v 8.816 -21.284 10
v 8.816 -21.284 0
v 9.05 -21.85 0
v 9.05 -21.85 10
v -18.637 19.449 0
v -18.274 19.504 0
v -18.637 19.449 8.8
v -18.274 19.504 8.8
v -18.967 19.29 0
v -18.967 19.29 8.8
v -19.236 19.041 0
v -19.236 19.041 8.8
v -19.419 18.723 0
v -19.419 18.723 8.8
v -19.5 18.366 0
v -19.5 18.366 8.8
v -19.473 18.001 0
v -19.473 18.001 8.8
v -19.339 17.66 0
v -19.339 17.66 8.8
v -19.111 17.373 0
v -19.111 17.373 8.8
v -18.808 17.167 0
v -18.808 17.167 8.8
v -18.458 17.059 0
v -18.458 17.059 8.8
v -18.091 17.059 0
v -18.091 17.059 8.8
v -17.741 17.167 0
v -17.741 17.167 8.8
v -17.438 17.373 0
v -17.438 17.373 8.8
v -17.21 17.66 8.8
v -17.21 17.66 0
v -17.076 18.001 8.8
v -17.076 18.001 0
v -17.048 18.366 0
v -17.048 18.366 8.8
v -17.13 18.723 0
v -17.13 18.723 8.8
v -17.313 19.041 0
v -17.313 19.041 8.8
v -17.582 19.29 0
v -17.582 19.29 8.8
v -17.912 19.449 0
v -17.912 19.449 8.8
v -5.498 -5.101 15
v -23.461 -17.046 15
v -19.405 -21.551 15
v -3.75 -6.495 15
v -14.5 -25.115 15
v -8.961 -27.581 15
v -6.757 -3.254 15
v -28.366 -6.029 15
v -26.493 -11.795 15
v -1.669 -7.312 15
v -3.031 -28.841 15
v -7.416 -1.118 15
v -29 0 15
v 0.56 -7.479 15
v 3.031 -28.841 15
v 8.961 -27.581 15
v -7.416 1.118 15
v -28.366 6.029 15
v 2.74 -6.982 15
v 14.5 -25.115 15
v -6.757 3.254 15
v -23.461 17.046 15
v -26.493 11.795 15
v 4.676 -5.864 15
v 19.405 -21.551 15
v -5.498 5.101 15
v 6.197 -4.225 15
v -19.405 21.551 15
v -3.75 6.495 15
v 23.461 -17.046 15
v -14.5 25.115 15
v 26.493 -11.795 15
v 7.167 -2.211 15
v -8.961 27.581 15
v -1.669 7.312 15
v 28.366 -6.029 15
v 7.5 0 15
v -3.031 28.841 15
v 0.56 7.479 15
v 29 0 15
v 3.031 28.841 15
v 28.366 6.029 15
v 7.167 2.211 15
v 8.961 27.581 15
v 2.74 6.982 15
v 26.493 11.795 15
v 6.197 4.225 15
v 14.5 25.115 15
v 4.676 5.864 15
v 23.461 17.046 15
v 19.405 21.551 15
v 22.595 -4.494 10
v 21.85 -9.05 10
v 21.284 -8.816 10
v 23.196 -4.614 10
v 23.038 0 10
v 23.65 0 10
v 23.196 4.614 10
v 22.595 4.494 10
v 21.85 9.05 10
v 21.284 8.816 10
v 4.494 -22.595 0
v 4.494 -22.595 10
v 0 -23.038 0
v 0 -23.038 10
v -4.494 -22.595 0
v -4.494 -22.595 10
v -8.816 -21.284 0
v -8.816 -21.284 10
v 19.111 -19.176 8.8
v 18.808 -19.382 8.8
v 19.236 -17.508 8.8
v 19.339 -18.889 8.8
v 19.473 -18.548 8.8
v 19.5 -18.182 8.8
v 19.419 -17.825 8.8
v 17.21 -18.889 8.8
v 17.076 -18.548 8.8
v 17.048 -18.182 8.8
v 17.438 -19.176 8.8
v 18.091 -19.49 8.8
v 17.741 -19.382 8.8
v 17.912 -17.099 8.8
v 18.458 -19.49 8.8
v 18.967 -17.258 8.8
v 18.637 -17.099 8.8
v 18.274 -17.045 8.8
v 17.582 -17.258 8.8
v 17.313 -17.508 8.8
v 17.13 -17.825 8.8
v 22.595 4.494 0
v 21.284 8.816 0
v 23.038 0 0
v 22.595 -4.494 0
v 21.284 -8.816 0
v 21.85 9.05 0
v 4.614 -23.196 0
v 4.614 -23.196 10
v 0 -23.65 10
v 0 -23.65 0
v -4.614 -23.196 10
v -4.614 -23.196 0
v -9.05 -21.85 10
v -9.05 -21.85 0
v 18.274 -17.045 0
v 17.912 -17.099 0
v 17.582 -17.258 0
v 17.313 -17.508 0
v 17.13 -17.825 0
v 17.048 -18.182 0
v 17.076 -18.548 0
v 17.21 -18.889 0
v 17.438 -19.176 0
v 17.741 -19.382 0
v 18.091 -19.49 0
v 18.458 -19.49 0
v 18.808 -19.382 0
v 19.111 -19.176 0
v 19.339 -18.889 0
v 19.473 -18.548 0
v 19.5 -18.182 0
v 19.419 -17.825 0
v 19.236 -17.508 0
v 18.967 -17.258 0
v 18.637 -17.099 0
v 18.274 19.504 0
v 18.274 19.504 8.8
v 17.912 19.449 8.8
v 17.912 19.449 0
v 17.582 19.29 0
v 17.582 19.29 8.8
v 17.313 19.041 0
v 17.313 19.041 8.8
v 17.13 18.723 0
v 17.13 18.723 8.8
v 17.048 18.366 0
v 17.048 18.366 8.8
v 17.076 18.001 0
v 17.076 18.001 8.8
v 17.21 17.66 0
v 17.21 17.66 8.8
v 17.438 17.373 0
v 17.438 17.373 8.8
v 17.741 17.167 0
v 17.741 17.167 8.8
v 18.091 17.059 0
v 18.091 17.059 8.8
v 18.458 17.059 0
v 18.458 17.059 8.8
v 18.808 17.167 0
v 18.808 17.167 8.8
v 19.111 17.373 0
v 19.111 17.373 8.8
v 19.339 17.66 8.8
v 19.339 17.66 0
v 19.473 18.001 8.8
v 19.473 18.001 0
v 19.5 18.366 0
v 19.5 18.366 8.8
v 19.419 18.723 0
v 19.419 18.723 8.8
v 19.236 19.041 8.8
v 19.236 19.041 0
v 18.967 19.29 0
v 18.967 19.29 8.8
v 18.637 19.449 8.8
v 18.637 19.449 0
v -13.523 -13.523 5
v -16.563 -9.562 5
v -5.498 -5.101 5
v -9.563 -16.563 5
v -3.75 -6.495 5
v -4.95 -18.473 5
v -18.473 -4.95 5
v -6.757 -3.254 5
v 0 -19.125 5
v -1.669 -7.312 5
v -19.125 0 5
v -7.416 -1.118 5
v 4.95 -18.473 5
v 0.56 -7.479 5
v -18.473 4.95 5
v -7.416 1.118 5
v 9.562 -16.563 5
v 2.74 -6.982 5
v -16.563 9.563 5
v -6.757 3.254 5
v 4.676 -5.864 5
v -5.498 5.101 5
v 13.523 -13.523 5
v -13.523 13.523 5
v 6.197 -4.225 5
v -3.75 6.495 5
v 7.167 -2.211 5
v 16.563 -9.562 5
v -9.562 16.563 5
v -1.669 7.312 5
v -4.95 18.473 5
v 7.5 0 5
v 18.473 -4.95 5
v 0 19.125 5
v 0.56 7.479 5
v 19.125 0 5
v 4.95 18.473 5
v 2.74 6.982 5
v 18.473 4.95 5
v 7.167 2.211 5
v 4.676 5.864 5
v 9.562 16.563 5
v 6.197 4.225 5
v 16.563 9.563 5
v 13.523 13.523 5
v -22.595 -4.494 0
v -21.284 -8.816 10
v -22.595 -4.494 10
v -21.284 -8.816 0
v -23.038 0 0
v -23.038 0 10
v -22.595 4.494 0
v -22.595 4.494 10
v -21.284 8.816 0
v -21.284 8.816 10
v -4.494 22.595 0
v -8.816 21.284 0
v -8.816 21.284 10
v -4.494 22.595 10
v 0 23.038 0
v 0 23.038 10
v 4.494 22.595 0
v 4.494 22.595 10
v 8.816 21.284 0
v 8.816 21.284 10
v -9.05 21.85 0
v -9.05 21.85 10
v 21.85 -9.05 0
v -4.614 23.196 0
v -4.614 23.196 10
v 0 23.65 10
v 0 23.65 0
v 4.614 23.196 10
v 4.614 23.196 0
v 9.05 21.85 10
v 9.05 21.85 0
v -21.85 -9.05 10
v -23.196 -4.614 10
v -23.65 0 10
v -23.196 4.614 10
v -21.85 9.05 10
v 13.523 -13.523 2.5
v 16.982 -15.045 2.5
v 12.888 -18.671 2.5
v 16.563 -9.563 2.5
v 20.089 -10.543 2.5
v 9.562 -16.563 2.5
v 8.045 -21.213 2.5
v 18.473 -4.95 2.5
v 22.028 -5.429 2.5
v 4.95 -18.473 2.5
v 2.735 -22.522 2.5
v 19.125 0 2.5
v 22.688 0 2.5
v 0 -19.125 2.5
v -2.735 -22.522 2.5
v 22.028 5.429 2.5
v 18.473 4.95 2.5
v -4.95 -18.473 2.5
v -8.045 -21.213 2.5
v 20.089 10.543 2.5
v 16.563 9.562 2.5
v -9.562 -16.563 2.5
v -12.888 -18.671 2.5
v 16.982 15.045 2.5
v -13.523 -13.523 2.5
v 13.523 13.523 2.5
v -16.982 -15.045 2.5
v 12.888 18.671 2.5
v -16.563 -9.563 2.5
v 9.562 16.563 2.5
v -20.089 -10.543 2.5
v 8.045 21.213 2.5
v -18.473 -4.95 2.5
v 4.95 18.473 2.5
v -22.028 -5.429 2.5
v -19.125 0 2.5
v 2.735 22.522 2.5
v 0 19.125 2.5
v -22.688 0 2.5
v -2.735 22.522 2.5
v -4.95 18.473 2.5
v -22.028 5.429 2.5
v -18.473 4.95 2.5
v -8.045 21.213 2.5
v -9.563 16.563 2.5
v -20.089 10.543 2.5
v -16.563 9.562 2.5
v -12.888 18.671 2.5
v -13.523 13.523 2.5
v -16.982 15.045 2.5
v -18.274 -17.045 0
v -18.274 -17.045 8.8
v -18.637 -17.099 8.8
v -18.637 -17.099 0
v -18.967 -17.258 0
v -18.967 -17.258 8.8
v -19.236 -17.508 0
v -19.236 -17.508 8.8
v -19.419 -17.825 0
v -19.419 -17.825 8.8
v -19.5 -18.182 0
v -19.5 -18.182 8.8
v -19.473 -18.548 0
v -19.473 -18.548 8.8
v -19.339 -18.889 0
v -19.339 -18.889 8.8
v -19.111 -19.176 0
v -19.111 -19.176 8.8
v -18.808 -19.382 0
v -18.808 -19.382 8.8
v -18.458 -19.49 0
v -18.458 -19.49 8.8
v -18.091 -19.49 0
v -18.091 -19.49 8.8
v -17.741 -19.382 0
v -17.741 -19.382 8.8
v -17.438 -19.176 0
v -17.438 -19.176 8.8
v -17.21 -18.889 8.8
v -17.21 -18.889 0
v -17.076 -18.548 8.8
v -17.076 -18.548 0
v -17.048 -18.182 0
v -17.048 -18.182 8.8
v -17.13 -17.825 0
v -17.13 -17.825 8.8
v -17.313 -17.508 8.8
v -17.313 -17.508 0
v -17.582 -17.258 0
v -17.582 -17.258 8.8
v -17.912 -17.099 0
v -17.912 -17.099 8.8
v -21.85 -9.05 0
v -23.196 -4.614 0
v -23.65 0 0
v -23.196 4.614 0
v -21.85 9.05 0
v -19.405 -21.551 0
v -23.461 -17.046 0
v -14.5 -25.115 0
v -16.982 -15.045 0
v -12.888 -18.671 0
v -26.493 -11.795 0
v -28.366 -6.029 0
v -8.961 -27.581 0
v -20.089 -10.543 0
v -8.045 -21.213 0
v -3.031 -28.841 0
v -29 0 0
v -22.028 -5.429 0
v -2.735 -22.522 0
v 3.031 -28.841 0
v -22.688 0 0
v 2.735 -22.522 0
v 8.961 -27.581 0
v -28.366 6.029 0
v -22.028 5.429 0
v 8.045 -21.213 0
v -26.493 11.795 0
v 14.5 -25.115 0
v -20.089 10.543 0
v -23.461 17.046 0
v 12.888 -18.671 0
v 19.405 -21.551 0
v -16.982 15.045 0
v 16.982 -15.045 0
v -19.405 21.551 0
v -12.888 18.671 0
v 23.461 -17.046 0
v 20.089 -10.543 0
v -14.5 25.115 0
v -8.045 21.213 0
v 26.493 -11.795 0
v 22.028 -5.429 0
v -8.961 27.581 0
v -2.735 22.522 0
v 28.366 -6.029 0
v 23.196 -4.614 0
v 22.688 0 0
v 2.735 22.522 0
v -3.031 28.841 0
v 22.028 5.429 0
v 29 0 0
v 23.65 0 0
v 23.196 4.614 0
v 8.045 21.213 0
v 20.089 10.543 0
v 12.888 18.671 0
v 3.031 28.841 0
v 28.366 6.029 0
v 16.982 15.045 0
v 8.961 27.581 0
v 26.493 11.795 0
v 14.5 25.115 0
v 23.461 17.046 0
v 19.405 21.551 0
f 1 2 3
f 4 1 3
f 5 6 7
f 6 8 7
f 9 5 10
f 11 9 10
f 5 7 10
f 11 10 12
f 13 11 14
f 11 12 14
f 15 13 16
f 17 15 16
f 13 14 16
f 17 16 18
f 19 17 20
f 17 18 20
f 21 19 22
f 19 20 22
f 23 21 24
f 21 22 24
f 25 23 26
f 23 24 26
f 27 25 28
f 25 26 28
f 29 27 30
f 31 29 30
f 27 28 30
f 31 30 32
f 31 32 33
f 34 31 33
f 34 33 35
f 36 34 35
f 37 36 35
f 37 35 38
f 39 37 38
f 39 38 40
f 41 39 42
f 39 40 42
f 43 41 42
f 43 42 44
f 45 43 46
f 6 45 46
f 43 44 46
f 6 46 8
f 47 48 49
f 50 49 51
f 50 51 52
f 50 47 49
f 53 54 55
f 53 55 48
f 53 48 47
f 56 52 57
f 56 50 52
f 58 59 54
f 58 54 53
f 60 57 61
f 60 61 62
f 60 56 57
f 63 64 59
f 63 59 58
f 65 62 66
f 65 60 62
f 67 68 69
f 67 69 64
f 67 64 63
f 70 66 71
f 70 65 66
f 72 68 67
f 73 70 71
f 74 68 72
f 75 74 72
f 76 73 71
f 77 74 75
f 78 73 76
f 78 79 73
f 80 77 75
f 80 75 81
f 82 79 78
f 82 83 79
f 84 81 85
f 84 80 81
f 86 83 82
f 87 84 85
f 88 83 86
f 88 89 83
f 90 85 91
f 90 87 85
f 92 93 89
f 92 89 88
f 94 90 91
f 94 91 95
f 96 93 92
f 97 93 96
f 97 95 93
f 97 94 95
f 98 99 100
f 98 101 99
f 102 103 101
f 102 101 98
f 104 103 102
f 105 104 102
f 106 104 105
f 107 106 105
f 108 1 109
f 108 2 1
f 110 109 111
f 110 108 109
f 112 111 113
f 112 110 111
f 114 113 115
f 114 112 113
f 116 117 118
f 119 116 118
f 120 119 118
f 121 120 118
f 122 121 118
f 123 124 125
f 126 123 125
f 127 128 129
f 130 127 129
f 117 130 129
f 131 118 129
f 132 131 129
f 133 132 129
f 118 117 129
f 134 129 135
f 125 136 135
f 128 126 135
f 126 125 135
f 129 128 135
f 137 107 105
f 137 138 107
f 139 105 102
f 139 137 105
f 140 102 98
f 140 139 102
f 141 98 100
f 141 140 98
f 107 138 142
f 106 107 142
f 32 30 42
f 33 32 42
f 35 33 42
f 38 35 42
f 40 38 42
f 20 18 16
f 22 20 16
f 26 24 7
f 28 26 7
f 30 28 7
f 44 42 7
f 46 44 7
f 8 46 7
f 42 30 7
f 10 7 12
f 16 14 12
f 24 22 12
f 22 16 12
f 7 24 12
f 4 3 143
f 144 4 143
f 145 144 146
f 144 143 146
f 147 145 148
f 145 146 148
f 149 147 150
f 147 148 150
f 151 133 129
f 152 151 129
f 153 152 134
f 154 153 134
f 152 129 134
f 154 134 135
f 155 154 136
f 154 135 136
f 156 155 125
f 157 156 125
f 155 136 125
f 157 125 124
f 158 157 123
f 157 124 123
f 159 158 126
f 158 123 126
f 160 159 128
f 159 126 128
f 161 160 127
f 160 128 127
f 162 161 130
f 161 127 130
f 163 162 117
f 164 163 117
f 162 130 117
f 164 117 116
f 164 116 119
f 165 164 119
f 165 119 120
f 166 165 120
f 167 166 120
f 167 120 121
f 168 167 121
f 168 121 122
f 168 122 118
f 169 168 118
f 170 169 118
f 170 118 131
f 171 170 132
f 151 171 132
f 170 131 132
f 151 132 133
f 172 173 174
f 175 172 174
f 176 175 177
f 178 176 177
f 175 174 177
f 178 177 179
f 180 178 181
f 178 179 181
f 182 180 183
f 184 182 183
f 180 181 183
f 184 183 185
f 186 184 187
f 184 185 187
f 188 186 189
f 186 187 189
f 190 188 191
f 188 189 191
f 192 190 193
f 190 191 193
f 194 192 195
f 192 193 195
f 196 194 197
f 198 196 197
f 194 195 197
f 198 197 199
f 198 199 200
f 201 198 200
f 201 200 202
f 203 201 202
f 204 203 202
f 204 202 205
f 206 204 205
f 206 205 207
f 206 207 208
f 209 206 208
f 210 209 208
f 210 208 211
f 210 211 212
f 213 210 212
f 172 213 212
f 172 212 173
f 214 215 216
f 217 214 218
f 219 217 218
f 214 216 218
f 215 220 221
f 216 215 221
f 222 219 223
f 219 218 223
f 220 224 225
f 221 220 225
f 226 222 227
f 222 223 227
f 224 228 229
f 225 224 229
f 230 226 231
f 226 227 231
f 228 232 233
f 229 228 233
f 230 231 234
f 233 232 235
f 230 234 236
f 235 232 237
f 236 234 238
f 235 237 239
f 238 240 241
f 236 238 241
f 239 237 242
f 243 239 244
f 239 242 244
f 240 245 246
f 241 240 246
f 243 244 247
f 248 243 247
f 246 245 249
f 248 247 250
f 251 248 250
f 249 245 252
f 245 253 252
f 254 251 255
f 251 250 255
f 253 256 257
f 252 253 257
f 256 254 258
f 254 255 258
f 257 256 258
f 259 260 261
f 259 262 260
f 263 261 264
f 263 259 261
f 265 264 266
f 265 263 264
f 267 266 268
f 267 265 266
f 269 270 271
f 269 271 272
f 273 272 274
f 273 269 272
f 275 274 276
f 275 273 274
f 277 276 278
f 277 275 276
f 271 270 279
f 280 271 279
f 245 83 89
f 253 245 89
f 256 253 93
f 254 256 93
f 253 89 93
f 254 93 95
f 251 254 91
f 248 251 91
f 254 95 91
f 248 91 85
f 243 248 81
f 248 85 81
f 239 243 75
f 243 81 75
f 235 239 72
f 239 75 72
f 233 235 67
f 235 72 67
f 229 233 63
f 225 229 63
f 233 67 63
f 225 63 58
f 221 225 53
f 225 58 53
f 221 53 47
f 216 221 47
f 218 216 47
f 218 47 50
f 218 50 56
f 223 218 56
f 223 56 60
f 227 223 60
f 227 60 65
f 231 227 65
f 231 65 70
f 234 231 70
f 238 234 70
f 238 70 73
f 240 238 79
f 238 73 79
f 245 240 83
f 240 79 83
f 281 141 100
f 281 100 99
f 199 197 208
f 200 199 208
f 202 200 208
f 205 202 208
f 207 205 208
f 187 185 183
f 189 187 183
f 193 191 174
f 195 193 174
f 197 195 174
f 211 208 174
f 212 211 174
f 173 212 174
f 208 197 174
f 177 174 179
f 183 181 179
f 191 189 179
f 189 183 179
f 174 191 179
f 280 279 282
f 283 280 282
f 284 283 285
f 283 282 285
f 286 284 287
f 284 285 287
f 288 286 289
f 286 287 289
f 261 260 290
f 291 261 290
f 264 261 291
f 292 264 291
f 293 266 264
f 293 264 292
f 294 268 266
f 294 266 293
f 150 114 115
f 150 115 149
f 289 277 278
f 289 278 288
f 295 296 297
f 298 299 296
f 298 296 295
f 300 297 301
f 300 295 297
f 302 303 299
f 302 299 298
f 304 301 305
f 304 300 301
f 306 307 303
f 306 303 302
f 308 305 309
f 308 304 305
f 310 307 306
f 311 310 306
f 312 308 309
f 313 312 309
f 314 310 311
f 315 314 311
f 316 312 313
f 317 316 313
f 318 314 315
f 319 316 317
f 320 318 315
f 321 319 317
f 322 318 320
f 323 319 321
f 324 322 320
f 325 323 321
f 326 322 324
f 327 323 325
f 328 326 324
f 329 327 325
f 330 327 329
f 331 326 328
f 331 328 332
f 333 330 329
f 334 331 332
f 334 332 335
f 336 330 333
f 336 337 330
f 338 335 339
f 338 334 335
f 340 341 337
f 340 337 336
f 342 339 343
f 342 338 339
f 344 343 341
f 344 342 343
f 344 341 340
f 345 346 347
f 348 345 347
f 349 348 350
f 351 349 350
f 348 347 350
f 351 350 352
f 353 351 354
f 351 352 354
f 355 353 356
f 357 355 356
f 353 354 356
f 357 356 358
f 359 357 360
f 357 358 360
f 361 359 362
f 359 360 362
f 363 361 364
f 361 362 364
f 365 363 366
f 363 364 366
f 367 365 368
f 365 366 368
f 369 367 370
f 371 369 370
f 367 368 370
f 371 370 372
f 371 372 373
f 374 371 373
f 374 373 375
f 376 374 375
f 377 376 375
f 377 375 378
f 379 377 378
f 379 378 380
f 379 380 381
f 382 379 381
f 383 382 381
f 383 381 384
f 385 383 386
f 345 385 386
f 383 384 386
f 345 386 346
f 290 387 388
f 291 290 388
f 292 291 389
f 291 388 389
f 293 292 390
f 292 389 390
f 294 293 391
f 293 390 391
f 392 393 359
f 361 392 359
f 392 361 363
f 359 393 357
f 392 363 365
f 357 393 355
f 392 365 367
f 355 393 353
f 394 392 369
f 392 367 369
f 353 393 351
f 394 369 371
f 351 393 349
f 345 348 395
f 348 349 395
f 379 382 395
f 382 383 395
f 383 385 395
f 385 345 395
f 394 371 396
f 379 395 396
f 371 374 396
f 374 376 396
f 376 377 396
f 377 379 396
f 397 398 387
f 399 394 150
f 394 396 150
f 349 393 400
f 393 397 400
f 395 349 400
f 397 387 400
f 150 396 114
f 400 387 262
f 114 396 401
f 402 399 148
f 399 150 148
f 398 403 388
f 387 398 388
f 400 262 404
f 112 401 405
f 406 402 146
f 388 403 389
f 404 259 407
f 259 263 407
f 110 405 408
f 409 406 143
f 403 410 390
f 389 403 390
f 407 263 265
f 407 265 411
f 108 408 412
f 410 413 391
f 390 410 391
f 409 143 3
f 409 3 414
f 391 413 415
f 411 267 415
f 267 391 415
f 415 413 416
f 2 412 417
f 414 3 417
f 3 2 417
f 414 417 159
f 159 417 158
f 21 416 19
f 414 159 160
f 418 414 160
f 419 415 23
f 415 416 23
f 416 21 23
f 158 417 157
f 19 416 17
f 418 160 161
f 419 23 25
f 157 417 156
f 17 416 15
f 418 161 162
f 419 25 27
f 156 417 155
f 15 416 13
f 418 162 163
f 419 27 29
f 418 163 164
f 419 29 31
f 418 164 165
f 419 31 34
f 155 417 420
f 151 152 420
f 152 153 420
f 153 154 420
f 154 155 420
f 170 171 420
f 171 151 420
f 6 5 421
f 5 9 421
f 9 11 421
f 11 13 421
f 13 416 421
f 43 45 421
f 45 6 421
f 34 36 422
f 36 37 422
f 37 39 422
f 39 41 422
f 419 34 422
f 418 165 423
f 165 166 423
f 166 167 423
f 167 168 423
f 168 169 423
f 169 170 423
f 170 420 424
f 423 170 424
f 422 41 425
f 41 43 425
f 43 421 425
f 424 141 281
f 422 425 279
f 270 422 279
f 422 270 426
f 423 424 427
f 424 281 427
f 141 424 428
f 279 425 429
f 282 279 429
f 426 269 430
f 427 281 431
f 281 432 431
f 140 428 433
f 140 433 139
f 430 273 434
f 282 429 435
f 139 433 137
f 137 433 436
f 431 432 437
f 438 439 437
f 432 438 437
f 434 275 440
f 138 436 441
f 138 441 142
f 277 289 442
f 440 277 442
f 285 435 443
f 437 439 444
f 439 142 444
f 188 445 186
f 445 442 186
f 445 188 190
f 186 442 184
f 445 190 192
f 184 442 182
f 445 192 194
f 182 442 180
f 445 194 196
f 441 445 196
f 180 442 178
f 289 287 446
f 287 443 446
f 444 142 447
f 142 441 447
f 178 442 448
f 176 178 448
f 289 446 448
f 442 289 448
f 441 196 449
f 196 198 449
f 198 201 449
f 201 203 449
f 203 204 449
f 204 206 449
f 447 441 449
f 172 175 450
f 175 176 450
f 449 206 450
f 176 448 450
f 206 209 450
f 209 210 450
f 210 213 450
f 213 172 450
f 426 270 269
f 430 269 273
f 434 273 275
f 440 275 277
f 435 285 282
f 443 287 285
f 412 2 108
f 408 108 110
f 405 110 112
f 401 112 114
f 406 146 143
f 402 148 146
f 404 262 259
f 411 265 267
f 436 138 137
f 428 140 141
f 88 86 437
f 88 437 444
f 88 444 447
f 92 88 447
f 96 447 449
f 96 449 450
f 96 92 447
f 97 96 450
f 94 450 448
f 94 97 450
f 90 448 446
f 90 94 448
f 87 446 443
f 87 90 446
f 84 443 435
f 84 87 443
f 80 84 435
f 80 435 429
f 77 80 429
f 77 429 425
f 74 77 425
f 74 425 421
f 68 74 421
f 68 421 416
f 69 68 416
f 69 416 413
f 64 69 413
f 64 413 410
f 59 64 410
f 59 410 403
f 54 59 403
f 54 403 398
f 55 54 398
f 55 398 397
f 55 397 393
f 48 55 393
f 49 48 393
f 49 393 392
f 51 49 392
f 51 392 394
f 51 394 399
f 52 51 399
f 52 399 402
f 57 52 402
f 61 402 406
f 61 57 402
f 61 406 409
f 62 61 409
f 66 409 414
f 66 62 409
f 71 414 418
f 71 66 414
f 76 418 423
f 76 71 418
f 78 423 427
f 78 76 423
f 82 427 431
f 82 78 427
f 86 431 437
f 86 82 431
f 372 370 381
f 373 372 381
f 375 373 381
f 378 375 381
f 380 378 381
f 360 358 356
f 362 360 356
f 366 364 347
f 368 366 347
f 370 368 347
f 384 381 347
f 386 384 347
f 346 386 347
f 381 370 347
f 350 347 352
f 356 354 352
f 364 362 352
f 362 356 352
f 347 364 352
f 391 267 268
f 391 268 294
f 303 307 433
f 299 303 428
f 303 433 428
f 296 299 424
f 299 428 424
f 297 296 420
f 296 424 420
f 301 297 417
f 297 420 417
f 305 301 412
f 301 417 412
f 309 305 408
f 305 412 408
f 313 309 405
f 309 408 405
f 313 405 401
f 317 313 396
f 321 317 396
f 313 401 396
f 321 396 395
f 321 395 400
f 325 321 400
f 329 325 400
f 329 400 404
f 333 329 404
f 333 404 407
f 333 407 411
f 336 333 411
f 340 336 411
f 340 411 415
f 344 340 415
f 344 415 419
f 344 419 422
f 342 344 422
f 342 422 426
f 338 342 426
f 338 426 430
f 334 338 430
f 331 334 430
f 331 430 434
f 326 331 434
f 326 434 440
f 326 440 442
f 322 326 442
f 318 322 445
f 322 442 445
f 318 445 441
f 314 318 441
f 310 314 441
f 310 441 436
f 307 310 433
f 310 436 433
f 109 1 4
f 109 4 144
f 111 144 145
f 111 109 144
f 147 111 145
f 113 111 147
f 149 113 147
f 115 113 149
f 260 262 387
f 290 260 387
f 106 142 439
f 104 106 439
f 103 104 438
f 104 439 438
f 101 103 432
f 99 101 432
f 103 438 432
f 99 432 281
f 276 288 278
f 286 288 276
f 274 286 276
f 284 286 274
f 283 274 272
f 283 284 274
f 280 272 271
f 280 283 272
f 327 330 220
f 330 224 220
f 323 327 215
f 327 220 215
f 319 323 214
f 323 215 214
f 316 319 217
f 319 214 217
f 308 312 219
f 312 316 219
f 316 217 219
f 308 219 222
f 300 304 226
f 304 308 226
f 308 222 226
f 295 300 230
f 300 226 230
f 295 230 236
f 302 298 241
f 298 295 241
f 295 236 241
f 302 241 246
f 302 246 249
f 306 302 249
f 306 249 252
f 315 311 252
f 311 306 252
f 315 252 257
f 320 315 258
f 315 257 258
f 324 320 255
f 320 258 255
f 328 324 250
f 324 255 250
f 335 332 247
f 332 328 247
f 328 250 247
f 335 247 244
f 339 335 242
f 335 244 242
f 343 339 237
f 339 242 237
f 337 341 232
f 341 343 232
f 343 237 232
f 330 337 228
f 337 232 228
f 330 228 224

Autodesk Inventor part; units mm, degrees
ref_plane "YZ Plane" through (0, 0, 0) normal (1, 0, 0) x (0, 1, 0)
ref_plane "XZ Plane" through (0, 0, 0) normal (0, 1, 0) x (-1, 0, 0)
ref_plane "XY Plane" through (0, 0, 0) normal (0, 0, 1) x (1, 0, 0)
sketch "Sketch1" plane through (0, 0, 0) normal (0, 0, 1) x (1, 0, 0)
  circle A0 centre (0, 0) radius 24
  circle A1 centre (0, 0) radius 22.6875
  dimension "d0" = 48
  dimension "d2" = 45.375
extrude "Extrusion1" add sketch "Sketch1" along normal blind 5
sketch "Sketch2" plane through (0, 0, 5) normal (0, 0, 1) x (1, 0, 0)
  circle A0 centre (0, 0) radius 24 projected
extrude "Extrusion2" add sketch "Sketch2" along normal blind 10
sketch "Sketch3" plane through (0, 0, 0) normal (0, 0, -1) x (-1, 0, 0)
  circle A0 centre (0, 0) radius 22.6875
  circle A1 centre (0, 0) radius 24
  arc A2 (8.8161, 21.2839) -> (-8.8161, 21.2839) centre (0, 0) ccw
  arc A3 (9.0505, 21.8498) -> (-9.0505, 21.8498) centre (0, 0) ccw
  circle A4 centre (0, 0) radius 7.5
  line L0 (0, 0) -> (0, 19.001)
  line L1 (-8.8161, 21.2839) -> (-9.0505, 21.8498)
  line L2 (8.8161, 21.2839) -> (9.0505, 21.8498)
  arc A5 (-21.2839, 8.8161) -> (-21.2839, -8.8161) centre (0, 0) ccw
  arc A6 (-21.8498, 9.0505) -> (-21.8498, -9.0505) centre (0, 0) ccw
  line L3 (-21.2839, -8.8161) -> (-21.8498, -9.0505)
  line L4 (-21.2839, 8.8161) -> (-21.8498, 9.0505)
  arc A7 (-8.8161, -21.2839) -> (8.8161, -21.2839) centre (0, 0) ccw
  arc A8 (-9.0505, -21.8498) -> (9.0505, -21.8498) centre (0, 0) ccw
  line L5 (8.8161, -21.2839) -> (9.0505, -21.8498)
  line L6 (-8.8161, -21.2839) -> (-9.0505, -21.8498)
  arc A9 (21.2839, -8.8161) -> (21.2839, 8.8161) centre (0, 0) ccw
  arc A10 (21.8498, -9.0505) -> (21.8498, 9.0505) centre (0, 0) ccw
  line L7 (21.2839, 8.8161) -> (21.8498, 9.0505)
  line L8 (21.2839, -8.8161) -> (21.8498, -9.0505)
  point P0 (-19.001, 0)
  point P1 (0, -19.001)
  point P2 (19.001, 0)
  dimension "d11" = 0.35
  dimension "d10" = 0.35
  dimension "d9" = 360
ref_plane "Work Plane1" through (0, -22.4669, -8.75) normal (0, 0, -1) x (-1, 0, 0)
extrude "Extrusion6" cut sketch "Sketch3" against normal blind 10 contours A2 L1 A3 L2 | A5 L3 A6 L4 | A7 L5 A8 L6 | A9 L7 A10 L8
sketch "Sketch6" plane through (0, 0, 15) normal (0, 0, 1) x (1, 0, 0)
  circle A0 centre (0, 0) radius 7.5
  dimension "d29" = 15
extrude "Extrusion7" cut sketch "Sketch6" against normal blind 10
sketch "Sketch7" plane through (0, 0, 5) normal (0, 0, -1) x (-1, 0, 0)
  circle A0 centre (0, 0) radius 7.5493
  line L0 (-4.0263, 15.0987) -> (-4.0263, 7.5493)
  arc A1 (-4.0263, 7.5493) -> (-8.5511, -0.2878) centre (0, 0) ccw
  line L1 (-8.5511, -0.2878) -> (-15.089, -4.0625)
  arc A2 (-15.089, -4.0625) -> (-11.0627, -11.0362) centre (-13.0758, -7.5493) ccw
  line L2 (-11.0627, -11.0362) -> (-4.5248, -7.2616)
  arc A3 (-4.5248, -7.2616) -> (4.5248, -7.2616) centre (0, 0) ccw
  line L3 (4.5248, -7.2616) -> (11.0627, -11.0362)
  arc A4 (11.0627, -11.0362) -> (15.089, -4.0625) centre (13.0758, -7.5493) ccw
  line L4 (15.089, -4.0625) -> (8.5511, -0.2878)
  arc A5 (8.5511, -0.2878) -> (4.0263, 7.5493) centre (0, 0) ccw
  line L5 (4.0263, 7.5493) -> (4.0263, 15.0987)
  arc A6 (4.0263, 15.0987) -> (-4.0263, 15.0987) centre (0, 15.0987) ccw
  circle A7 centre (0, 0) radius 19.125
  circle A8 centre (0, 0) radius 7.5 projected
  circle A9 centre (0, 0) radius 22.6875 projected
  dimension "d34" = 38.25
extrude "Extrusion8" add sketch "Sketch7" along normal blind 2.5 contours A9
sketch "Sketch8" plane through (0, 0, 15) normal (0, 0, 1) x (1, 0, 0)
  circle A0 centre (0, 0) radius 29
  circle A1 centre (0, 0) radius 24 projected
  dimension "d35" = 58
extrude "Extrusion9" add sketch "Sketch8" against normal up to surface (15 mm away)
sketch "Sketch9" plane through (0, 0, 0) normal (0, 0, -1) x (-1, 0, 0)
  line L0 (16.0425, 16.0425) -> (18.2743, 18.2743)
  line L1 (0, 0) -> (49.853, 0) construction
  circle A0 centre (0, 0) radius 22.6875 projected
  circle A1 centre (0, 0) radius 29 projected
  circle A2 centre (0, 0) radius 25.8438
  point P0 (-18.2743, 18.2743)
  point P1 (-18.2743, -18.2743)
  point P2 (18.2743, -18.2743)
  dimension "d39" = 45.375
  dimension "d41" = 51.6875
  dimension "d38" = 45
  dimension "d40" = 58
  dimension "d44" = 360
  dimension "d53" = 6.3125
hole "Hole1" at (-18.2743, 18.2743, 0) at (18.2743, 18.2743, 0) at (18.2743, -18.2743, 0) at (-18.2743, -18.2743, 0) direction (0, 0, 1) diameter 2.459 depth 8.8 thread size "M3x0.5" class "6H" standard "ISO Metric profile"
sketch "Sketch10" plane through (0, 0, 0) normal (0, 0, -1) x (-1, 0, 0)
  circle A0 centre (18.2743, 18.2743) radius 1.2295 projected
  circle A1 centre (18.2743, -18.2743) radius 1.2295 projected
  circle A2 centre (-18.2743, -18.2743) radius 1.2295 projected
  circle A3 centre (-18.2743, 18.2743) radius 1.2295 projected
  point P0 (0, 0)
equation "\"d41\" = 0.5 * d40 + 0.5 * d39"
properties part number "Housing of planetary gearbox part 2" material "Steel, Alloy"
